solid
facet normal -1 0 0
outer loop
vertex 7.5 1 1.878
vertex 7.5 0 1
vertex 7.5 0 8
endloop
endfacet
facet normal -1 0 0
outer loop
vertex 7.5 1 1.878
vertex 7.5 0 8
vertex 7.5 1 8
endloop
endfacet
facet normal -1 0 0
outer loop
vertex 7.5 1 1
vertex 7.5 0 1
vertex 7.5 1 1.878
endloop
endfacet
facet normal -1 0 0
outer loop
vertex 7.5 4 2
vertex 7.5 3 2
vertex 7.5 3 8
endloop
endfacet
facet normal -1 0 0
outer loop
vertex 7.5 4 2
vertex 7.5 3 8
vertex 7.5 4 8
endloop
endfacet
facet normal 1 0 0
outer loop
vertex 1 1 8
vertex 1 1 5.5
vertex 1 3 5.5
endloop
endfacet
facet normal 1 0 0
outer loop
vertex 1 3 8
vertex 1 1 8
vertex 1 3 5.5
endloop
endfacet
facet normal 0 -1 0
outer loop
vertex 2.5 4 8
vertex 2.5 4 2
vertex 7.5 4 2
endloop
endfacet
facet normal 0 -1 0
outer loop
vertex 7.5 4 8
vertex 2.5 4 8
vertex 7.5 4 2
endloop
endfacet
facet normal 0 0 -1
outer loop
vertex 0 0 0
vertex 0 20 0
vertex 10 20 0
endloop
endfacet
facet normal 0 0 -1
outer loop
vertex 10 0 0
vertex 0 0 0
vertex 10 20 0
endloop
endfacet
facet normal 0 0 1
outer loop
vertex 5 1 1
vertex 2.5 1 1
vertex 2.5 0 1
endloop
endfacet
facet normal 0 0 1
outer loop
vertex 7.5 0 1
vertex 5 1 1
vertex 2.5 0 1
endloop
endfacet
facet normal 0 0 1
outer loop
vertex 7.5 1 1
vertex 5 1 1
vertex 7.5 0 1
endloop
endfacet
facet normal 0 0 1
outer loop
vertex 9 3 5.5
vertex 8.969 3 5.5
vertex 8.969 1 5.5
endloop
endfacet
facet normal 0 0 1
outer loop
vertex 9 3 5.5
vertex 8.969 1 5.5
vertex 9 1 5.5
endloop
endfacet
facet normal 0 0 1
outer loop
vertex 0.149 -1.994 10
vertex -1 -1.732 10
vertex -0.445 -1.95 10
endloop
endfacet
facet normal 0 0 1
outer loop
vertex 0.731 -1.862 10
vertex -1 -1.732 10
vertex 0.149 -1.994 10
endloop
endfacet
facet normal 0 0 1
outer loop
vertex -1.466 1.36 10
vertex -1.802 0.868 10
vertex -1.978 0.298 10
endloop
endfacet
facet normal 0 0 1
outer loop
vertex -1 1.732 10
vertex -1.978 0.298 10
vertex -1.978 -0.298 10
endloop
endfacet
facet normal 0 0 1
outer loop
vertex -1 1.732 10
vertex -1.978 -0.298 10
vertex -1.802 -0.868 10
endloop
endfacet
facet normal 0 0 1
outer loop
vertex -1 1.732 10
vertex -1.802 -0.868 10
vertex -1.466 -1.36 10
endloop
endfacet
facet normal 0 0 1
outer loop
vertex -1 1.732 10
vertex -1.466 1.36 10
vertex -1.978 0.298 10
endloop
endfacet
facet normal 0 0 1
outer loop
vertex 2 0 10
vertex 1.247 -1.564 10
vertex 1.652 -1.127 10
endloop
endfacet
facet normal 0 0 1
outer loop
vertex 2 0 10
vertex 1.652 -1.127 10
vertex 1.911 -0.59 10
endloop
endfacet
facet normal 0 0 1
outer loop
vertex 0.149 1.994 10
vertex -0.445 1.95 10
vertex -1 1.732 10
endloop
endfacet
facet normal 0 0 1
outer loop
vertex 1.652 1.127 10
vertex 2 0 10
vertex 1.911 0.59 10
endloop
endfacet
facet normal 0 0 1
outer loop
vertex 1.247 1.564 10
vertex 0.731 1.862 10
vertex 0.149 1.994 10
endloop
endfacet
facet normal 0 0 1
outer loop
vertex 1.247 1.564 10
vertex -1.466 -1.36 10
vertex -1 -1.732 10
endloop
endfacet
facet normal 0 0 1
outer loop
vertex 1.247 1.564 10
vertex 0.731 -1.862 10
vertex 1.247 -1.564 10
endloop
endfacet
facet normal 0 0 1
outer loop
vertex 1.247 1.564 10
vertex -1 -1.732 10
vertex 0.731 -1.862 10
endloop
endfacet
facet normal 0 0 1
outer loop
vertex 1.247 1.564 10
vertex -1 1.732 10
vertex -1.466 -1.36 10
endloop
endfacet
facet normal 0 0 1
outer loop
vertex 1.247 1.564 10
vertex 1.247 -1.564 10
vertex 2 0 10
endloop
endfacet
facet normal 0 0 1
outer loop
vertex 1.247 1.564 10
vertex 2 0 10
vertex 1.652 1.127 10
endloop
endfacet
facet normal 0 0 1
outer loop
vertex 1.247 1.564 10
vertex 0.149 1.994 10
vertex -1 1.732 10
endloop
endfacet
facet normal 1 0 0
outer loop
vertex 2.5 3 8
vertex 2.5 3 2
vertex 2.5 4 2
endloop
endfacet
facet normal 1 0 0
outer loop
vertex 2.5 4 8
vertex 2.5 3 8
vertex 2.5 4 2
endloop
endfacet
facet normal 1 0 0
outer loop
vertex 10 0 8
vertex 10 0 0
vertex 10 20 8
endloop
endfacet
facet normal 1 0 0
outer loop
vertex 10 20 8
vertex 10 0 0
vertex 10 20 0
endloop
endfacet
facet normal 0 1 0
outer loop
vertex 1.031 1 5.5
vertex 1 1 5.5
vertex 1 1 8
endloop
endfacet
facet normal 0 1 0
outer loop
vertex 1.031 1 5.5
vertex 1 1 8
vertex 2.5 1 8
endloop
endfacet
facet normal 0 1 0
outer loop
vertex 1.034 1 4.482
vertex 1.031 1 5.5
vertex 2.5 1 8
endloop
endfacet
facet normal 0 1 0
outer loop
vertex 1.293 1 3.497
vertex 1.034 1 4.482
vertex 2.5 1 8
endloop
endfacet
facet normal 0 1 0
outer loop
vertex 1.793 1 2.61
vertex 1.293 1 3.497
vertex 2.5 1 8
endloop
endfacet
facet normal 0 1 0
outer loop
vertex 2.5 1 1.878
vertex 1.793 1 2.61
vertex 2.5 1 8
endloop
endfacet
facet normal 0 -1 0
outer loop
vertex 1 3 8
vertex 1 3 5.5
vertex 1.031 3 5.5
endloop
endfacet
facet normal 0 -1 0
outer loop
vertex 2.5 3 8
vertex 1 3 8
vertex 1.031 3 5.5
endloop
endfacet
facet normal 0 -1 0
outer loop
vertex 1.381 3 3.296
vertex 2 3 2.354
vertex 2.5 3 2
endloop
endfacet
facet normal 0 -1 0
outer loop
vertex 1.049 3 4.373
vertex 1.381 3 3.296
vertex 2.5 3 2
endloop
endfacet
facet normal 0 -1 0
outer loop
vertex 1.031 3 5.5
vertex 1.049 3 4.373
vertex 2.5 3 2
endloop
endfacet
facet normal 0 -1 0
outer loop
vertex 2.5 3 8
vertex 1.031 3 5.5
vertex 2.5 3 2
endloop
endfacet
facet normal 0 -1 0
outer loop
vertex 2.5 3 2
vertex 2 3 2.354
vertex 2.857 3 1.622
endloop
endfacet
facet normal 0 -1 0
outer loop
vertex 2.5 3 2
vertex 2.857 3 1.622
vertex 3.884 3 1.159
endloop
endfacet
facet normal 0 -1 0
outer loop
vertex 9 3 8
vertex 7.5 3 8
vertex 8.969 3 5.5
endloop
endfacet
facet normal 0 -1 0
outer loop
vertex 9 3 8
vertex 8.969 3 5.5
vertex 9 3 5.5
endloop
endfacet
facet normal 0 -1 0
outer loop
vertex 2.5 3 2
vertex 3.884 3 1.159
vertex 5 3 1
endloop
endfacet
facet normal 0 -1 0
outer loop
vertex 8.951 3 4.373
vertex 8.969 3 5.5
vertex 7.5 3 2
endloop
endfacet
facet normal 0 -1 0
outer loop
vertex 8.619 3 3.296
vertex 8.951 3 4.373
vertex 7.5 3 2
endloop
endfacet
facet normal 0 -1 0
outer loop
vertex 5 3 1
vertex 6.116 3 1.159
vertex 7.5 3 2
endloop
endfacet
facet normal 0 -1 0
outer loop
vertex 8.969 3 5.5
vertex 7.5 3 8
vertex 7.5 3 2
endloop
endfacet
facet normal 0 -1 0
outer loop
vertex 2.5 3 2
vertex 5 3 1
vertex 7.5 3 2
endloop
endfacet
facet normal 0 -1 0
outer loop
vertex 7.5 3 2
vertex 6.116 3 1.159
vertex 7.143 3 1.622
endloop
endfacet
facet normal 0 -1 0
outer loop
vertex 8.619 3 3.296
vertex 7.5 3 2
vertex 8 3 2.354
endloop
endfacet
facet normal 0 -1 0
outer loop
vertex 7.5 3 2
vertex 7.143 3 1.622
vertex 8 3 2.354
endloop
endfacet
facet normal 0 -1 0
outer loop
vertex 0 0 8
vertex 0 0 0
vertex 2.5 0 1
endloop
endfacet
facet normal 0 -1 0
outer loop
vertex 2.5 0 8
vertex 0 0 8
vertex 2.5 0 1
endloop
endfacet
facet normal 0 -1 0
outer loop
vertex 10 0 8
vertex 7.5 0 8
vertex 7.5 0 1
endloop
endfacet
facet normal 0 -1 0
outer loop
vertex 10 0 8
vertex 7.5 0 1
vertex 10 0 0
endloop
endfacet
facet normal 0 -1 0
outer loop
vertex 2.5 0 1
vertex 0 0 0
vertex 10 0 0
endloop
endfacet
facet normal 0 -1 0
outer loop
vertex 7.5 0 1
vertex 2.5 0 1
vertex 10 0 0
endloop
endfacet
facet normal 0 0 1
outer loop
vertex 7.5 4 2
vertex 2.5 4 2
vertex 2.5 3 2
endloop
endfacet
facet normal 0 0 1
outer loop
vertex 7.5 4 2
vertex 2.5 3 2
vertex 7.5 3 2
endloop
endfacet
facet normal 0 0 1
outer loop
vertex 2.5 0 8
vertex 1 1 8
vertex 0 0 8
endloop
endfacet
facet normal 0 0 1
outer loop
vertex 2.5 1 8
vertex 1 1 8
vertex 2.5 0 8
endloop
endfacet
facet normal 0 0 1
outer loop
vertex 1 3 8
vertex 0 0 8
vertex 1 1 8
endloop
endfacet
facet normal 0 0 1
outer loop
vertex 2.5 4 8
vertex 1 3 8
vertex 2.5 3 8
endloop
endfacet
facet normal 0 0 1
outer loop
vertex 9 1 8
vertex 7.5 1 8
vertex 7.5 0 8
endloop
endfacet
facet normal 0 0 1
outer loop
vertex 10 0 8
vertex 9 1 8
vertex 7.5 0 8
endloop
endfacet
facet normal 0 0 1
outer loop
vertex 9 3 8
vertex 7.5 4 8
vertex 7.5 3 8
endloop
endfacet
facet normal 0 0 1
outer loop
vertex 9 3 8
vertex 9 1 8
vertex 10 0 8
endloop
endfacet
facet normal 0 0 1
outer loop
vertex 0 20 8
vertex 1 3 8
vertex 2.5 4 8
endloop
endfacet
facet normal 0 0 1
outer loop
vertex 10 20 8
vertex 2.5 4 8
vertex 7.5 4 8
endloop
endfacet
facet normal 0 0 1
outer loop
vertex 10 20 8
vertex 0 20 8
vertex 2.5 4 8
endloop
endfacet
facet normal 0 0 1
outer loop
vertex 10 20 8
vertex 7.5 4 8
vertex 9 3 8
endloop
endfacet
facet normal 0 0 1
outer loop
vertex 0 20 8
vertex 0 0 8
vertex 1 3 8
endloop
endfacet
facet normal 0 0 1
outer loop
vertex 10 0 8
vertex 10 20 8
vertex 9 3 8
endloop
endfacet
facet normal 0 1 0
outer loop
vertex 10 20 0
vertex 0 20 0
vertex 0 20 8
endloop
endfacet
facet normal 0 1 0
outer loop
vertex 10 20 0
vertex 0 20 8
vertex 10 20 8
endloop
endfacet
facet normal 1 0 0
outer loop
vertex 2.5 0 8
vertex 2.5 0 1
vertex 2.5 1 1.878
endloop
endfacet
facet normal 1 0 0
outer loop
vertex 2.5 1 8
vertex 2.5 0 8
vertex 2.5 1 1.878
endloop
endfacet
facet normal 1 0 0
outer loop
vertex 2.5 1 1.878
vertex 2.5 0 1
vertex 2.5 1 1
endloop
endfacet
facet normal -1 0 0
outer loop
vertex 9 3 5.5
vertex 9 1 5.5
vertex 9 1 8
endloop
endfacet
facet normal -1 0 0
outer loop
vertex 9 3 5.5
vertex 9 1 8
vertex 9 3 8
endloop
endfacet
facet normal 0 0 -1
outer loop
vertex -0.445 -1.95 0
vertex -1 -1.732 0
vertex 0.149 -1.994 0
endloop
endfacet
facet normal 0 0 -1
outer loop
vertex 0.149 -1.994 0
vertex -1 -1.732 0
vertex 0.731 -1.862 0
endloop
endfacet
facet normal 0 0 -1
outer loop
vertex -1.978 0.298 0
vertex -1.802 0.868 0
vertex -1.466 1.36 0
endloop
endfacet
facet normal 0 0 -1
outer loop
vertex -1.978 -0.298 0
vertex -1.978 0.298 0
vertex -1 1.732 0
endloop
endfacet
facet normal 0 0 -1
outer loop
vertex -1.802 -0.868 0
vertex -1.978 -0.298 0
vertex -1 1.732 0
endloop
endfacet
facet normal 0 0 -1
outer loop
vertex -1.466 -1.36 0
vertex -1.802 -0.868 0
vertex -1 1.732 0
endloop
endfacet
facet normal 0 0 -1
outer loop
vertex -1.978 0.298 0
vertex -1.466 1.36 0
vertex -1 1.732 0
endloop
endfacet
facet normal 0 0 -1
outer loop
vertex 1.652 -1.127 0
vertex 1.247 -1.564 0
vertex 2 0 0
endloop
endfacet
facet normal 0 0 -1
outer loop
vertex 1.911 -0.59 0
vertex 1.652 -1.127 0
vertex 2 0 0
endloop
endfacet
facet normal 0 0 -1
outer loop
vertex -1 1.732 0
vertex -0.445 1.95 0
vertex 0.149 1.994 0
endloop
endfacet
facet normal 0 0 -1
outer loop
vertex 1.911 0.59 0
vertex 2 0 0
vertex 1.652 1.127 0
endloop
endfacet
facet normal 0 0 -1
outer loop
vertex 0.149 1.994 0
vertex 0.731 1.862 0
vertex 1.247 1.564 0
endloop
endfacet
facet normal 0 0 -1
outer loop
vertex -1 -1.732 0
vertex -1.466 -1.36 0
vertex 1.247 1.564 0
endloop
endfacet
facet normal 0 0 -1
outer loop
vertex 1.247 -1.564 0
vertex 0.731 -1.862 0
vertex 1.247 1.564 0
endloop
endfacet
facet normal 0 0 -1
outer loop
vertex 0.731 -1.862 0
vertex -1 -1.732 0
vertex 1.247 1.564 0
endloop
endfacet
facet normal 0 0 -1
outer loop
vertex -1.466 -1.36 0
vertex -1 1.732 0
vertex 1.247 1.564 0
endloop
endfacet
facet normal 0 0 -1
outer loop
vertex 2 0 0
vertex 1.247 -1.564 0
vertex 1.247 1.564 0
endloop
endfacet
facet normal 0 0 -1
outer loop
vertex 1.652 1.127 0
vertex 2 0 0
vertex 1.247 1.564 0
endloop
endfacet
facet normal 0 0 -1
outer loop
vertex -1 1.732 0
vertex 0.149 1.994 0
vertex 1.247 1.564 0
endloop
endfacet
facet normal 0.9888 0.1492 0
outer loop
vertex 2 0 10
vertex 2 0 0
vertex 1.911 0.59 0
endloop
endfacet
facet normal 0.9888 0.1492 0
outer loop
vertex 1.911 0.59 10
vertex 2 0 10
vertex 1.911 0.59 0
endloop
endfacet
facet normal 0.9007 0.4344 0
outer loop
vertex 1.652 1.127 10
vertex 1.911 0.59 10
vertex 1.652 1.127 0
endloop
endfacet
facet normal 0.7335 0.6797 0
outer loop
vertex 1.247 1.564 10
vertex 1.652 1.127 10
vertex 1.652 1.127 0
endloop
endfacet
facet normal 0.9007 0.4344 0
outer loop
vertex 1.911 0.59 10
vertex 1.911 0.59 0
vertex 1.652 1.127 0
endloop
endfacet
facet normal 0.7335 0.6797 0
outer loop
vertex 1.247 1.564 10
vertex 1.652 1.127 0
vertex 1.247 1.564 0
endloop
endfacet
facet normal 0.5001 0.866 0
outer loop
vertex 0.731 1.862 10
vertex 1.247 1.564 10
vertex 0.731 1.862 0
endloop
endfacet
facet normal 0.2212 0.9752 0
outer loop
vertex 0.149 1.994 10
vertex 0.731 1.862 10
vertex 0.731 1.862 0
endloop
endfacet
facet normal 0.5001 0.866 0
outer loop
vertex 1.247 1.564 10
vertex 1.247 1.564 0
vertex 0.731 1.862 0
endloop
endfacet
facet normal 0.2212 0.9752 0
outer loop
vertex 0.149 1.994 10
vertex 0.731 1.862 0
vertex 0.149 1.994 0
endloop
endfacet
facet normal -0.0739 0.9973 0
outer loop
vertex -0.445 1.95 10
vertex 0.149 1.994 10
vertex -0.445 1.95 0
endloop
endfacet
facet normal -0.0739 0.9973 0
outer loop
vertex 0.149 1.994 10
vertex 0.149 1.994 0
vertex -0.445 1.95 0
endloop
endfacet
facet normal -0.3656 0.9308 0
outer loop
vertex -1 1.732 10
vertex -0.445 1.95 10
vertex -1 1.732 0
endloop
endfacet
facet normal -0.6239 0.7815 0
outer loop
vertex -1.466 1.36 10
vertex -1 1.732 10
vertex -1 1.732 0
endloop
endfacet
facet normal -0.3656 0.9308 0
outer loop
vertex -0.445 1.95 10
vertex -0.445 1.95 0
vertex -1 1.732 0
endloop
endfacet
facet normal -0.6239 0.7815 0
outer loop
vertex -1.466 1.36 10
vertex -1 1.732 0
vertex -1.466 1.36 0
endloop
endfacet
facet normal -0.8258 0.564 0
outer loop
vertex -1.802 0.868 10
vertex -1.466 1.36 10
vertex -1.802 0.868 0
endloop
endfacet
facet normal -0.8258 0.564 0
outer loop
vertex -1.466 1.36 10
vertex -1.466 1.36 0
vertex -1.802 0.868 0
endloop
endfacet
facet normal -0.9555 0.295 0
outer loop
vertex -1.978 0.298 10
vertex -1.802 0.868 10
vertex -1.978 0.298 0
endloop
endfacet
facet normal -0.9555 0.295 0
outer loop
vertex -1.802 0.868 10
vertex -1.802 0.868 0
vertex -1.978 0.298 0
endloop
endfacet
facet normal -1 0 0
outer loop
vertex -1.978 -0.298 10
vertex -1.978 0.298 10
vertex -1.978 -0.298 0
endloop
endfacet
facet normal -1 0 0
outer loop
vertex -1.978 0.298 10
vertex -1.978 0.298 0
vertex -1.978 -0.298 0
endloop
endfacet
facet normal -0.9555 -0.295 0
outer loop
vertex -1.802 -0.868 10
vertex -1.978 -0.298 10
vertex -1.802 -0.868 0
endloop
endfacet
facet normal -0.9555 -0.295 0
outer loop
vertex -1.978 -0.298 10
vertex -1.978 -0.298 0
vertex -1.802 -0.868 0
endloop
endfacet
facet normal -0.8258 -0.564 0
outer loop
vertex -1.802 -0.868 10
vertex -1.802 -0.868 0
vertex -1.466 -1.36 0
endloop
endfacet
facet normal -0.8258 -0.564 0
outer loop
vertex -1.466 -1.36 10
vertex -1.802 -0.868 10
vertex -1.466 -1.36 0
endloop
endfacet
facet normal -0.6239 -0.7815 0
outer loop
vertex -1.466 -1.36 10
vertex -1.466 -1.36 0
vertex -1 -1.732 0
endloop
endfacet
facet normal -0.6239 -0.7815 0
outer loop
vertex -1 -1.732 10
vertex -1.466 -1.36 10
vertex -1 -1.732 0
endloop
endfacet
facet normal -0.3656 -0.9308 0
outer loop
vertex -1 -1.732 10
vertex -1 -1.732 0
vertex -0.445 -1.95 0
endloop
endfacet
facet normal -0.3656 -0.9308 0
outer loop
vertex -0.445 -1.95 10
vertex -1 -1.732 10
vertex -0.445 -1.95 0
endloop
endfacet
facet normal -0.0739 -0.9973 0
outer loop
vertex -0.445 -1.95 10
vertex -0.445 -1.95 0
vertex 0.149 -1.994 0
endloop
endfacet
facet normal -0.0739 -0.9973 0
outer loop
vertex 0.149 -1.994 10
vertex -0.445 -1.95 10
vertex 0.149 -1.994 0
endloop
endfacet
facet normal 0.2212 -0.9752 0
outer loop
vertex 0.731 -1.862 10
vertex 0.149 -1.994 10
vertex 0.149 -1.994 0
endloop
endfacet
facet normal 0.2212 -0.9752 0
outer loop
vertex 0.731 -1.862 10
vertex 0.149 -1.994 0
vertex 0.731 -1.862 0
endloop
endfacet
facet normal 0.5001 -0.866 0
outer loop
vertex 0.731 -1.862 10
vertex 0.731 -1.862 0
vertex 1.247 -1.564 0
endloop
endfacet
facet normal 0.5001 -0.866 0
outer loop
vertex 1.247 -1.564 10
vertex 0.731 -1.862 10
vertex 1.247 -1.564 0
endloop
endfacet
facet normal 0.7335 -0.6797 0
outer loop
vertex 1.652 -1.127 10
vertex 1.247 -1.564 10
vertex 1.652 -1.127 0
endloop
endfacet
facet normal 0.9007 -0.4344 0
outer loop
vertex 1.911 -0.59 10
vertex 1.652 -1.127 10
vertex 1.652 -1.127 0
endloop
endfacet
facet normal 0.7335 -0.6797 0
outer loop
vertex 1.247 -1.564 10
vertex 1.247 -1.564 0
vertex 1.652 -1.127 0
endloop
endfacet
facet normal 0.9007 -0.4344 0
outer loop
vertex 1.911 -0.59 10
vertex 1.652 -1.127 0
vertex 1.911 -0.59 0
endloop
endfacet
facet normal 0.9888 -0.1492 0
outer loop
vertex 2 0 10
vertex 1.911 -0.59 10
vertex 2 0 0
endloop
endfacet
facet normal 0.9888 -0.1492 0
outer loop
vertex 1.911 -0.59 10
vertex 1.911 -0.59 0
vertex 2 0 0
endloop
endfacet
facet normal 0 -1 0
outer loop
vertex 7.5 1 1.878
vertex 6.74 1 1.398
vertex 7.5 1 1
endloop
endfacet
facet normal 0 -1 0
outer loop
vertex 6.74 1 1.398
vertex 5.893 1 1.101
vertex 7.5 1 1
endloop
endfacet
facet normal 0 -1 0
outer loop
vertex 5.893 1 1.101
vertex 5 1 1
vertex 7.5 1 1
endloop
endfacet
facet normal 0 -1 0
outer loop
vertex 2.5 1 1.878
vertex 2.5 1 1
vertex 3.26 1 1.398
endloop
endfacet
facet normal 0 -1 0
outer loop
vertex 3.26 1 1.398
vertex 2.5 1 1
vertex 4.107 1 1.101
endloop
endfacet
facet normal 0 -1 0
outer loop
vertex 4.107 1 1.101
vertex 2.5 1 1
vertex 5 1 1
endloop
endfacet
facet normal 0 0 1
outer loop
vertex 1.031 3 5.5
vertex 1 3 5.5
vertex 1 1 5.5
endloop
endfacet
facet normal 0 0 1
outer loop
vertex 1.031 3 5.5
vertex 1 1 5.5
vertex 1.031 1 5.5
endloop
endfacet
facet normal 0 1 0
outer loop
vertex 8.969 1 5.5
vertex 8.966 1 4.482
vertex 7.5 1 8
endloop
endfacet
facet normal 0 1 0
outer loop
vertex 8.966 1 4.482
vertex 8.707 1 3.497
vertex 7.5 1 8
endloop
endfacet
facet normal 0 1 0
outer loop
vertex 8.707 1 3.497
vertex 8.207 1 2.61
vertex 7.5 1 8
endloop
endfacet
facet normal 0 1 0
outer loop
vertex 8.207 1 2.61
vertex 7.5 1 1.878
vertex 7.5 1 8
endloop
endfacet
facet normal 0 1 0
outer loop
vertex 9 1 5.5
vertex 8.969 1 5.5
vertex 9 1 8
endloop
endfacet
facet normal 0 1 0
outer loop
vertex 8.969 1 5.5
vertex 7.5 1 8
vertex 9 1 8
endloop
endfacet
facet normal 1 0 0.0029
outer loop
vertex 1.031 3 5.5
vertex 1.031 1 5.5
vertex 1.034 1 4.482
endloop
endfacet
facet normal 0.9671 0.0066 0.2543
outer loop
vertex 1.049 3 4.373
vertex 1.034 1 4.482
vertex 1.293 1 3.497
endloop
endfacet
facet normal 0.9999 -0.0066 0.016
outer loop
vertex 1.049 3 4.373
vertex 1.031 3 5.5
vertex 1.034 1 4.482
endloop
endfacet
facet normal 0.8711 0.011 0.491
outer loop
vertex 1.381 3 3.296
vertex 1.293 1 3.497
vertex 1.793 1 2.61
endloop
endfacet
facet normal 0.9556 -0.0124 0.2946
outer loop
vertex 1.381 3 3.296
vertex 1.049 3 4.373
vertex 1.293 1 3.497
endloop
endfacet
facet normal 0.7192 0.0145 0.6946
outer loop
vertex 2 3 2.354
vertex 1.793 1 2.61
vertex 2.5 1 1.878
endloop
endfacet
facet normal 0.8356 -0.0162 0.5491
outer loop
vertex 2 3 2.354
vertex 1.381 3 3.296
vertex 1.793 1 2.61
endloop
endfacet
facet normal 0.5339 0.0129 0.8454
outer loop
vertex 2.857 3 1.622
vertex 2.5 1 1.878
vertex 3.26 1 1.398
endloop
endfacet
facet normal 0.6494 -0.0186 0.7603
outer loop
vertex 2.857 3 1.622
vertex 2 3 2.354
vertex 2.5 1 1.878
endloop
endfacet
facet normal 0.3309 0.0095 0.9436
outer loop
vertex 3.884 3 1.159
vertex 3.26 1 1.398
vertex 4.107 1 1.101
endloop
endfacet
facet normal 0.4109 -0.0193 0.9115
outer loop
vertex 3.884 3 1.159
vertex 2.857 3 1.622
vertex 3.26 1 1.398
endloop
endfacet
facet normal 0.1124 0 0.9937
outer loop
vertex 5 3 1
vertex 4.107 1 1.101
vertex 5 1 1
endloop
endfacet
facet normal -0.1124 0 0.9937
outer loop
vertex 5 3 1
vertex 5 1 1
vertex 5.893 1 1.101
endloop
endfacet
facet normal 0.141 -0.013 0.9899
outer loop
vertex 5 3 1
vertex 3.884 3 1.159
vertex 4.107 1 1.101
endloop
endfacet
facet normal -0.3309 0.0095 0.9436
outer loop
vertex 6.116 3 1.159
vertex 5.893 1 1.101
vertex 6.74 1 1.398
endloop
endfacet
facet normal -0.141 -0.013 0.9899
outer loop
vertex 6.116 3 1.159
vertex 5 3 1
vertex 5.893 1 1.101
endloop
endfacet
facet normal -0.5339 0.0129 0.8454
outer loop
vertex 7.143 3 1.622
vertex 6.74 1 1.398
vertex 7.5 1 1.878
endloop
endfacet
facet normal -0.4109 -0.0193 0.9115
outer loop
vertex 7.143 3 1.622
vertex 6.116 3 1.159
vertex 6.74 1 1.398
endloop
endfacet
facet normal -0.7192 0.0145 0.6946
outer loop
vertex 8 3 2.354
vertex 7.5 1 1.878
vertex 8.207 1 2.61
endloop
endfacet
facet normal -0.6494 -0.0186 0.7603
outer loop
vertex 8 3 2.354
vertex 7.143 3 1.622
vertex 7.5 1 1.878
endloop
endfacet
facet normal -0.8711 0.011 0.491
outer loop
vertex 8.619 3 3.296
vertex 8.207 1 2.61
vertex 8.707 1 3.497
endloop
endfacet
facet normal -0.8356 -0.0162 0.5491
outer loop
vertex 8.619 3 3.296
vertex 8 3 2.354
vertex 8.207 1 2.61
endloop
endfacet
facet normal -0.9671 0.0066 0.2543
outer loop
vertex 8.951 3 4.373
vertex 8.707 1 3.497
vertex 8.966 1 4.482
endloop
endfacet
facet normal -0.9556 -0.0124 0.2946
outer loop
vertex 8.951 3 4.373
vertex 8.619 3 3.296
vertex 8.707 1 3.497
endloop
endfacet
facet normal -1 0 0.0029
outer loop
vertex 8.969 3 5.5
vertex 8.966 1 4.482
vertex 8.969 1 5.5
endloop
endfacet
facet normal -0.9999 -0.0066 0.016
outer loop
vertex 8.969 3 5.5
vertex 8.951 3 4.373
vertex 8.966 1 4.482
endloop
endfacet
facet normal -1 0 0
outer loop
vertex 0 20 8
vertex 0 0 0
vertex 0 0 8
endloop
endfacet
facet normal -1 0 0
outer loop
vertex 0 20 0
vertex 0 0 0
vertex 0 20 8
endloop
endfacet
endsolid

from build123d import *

# Parameters (mm, degrees)
BOX003_W            = 8
BOX003_H            = 2
BOX003_DEPTH        = 2.5
BOX002_W            = 5
BOX002_H            = 1
BOX002_DEPTH        = 6
BOX001_W            = 5
BOX001_H            = 1
BOX001_DEPTH        = 7
CYLINDER_R          = 4
CYLINDER_DEPTH      = 2
CYLINDER_ROLL_ANGLE = 90
BOX_W               = 10
BOX_H               = 20
BOX_DEPTH           = 8
CYLINDER001_R       = 2
CYLINDER001_DEPTH   = 10


with BuildPart() as cylinder_edge_refinement:
    # Box003 → Box003 (new body)
    with BuildSketch(Plane(origin=(1, 1, 5.5), x_dir=(1, 0, 0), z_dir=(0, 0, 1))):
        with Locations((4, 1)):
            Rectangle(BOX003_W, BOX003_H)
    extrude(amount=BOX003_DEPTH)


with BuildPart() as interior_opening:
    # Box002 → Box002 (new body)
    with BuildSketch(Plane(origin=(2.5, 3, 2), x_dir=(1, 0, 0), z_dir=(0, 0, 1))):
        with Locations((2.5, 0.5)):
            Rectangle(BOX002_W, BOX002_H)
    extrude(amount=BOX002_DEPTH)


with BuildPart() as end_opening:
    # Box001 → Box001 (new body)
    with BuildSketch(Plane(origin=(2.5, 0, 1), x_dir=(1, 0, 0), z_dir=(0, 0, 1))):
        with Locations((2.5, 0.5)):
            Rectangle(BOX001_W, BOX001_H)
    extrude(amount=BOX001_DEPTH)


with BuildPart() as solenoid_head_slot:
    # Cylinder → Cylinder (new body)
    with BuildSketch(Plane.XY):
        Circle(CYLINDER_R)
    extrude(amount=CYLINDER_DEPTH)


with BuildPart() as solenoid_head_slot_1:
    # Cylinder roll: moved
    add(solenoid_head_slot.part.rotate(Axis((0, 0, 0), (1, 0, 0)), CYLINDER_ROLL_ANGLE))


with BuildPart() as solenoid_head_slot_2:
    # Cylinder placement: moved
    add(solenoid_head_slot_1.part.moved(Location((5, 3, 5))))


with BuildPart() as cut003:
    # Box → Box (new body)
    with BuildSketch(Plane.XY):
        with Locations((5, 10)):
            Rectangle(BOX_W, BOX_H)
    extrude(amount=BOX_DEPTH)

    # Cut: cut solenoid_head_slot
    add(solenoid_head_slot_2.part, mode=Mode.SUBTRACT)

    # Cut001: cut end_opening
    add(end_opening.part, mode=Mode.SUBTRACT)

    # Cut002: cut interior_opening
    add(interior_opening.part, mode=Mode.SUBTRACT)

    # Cut003: cut cylinder_edge_refinement
    add(cylinder_edge_refinement.part, mode=Mode.SUBTRACT)


with BuildPart() as rounded_top:
    # Cylinder001 → Cylinder001 (new body)
    with BuildSketch(Plane.XY):
        Circle(CYLINDER001_R)
    extrude(amount=CYLINDER001_DEPTH)


solid = Compound([cut003.part, rounded_top.part])
